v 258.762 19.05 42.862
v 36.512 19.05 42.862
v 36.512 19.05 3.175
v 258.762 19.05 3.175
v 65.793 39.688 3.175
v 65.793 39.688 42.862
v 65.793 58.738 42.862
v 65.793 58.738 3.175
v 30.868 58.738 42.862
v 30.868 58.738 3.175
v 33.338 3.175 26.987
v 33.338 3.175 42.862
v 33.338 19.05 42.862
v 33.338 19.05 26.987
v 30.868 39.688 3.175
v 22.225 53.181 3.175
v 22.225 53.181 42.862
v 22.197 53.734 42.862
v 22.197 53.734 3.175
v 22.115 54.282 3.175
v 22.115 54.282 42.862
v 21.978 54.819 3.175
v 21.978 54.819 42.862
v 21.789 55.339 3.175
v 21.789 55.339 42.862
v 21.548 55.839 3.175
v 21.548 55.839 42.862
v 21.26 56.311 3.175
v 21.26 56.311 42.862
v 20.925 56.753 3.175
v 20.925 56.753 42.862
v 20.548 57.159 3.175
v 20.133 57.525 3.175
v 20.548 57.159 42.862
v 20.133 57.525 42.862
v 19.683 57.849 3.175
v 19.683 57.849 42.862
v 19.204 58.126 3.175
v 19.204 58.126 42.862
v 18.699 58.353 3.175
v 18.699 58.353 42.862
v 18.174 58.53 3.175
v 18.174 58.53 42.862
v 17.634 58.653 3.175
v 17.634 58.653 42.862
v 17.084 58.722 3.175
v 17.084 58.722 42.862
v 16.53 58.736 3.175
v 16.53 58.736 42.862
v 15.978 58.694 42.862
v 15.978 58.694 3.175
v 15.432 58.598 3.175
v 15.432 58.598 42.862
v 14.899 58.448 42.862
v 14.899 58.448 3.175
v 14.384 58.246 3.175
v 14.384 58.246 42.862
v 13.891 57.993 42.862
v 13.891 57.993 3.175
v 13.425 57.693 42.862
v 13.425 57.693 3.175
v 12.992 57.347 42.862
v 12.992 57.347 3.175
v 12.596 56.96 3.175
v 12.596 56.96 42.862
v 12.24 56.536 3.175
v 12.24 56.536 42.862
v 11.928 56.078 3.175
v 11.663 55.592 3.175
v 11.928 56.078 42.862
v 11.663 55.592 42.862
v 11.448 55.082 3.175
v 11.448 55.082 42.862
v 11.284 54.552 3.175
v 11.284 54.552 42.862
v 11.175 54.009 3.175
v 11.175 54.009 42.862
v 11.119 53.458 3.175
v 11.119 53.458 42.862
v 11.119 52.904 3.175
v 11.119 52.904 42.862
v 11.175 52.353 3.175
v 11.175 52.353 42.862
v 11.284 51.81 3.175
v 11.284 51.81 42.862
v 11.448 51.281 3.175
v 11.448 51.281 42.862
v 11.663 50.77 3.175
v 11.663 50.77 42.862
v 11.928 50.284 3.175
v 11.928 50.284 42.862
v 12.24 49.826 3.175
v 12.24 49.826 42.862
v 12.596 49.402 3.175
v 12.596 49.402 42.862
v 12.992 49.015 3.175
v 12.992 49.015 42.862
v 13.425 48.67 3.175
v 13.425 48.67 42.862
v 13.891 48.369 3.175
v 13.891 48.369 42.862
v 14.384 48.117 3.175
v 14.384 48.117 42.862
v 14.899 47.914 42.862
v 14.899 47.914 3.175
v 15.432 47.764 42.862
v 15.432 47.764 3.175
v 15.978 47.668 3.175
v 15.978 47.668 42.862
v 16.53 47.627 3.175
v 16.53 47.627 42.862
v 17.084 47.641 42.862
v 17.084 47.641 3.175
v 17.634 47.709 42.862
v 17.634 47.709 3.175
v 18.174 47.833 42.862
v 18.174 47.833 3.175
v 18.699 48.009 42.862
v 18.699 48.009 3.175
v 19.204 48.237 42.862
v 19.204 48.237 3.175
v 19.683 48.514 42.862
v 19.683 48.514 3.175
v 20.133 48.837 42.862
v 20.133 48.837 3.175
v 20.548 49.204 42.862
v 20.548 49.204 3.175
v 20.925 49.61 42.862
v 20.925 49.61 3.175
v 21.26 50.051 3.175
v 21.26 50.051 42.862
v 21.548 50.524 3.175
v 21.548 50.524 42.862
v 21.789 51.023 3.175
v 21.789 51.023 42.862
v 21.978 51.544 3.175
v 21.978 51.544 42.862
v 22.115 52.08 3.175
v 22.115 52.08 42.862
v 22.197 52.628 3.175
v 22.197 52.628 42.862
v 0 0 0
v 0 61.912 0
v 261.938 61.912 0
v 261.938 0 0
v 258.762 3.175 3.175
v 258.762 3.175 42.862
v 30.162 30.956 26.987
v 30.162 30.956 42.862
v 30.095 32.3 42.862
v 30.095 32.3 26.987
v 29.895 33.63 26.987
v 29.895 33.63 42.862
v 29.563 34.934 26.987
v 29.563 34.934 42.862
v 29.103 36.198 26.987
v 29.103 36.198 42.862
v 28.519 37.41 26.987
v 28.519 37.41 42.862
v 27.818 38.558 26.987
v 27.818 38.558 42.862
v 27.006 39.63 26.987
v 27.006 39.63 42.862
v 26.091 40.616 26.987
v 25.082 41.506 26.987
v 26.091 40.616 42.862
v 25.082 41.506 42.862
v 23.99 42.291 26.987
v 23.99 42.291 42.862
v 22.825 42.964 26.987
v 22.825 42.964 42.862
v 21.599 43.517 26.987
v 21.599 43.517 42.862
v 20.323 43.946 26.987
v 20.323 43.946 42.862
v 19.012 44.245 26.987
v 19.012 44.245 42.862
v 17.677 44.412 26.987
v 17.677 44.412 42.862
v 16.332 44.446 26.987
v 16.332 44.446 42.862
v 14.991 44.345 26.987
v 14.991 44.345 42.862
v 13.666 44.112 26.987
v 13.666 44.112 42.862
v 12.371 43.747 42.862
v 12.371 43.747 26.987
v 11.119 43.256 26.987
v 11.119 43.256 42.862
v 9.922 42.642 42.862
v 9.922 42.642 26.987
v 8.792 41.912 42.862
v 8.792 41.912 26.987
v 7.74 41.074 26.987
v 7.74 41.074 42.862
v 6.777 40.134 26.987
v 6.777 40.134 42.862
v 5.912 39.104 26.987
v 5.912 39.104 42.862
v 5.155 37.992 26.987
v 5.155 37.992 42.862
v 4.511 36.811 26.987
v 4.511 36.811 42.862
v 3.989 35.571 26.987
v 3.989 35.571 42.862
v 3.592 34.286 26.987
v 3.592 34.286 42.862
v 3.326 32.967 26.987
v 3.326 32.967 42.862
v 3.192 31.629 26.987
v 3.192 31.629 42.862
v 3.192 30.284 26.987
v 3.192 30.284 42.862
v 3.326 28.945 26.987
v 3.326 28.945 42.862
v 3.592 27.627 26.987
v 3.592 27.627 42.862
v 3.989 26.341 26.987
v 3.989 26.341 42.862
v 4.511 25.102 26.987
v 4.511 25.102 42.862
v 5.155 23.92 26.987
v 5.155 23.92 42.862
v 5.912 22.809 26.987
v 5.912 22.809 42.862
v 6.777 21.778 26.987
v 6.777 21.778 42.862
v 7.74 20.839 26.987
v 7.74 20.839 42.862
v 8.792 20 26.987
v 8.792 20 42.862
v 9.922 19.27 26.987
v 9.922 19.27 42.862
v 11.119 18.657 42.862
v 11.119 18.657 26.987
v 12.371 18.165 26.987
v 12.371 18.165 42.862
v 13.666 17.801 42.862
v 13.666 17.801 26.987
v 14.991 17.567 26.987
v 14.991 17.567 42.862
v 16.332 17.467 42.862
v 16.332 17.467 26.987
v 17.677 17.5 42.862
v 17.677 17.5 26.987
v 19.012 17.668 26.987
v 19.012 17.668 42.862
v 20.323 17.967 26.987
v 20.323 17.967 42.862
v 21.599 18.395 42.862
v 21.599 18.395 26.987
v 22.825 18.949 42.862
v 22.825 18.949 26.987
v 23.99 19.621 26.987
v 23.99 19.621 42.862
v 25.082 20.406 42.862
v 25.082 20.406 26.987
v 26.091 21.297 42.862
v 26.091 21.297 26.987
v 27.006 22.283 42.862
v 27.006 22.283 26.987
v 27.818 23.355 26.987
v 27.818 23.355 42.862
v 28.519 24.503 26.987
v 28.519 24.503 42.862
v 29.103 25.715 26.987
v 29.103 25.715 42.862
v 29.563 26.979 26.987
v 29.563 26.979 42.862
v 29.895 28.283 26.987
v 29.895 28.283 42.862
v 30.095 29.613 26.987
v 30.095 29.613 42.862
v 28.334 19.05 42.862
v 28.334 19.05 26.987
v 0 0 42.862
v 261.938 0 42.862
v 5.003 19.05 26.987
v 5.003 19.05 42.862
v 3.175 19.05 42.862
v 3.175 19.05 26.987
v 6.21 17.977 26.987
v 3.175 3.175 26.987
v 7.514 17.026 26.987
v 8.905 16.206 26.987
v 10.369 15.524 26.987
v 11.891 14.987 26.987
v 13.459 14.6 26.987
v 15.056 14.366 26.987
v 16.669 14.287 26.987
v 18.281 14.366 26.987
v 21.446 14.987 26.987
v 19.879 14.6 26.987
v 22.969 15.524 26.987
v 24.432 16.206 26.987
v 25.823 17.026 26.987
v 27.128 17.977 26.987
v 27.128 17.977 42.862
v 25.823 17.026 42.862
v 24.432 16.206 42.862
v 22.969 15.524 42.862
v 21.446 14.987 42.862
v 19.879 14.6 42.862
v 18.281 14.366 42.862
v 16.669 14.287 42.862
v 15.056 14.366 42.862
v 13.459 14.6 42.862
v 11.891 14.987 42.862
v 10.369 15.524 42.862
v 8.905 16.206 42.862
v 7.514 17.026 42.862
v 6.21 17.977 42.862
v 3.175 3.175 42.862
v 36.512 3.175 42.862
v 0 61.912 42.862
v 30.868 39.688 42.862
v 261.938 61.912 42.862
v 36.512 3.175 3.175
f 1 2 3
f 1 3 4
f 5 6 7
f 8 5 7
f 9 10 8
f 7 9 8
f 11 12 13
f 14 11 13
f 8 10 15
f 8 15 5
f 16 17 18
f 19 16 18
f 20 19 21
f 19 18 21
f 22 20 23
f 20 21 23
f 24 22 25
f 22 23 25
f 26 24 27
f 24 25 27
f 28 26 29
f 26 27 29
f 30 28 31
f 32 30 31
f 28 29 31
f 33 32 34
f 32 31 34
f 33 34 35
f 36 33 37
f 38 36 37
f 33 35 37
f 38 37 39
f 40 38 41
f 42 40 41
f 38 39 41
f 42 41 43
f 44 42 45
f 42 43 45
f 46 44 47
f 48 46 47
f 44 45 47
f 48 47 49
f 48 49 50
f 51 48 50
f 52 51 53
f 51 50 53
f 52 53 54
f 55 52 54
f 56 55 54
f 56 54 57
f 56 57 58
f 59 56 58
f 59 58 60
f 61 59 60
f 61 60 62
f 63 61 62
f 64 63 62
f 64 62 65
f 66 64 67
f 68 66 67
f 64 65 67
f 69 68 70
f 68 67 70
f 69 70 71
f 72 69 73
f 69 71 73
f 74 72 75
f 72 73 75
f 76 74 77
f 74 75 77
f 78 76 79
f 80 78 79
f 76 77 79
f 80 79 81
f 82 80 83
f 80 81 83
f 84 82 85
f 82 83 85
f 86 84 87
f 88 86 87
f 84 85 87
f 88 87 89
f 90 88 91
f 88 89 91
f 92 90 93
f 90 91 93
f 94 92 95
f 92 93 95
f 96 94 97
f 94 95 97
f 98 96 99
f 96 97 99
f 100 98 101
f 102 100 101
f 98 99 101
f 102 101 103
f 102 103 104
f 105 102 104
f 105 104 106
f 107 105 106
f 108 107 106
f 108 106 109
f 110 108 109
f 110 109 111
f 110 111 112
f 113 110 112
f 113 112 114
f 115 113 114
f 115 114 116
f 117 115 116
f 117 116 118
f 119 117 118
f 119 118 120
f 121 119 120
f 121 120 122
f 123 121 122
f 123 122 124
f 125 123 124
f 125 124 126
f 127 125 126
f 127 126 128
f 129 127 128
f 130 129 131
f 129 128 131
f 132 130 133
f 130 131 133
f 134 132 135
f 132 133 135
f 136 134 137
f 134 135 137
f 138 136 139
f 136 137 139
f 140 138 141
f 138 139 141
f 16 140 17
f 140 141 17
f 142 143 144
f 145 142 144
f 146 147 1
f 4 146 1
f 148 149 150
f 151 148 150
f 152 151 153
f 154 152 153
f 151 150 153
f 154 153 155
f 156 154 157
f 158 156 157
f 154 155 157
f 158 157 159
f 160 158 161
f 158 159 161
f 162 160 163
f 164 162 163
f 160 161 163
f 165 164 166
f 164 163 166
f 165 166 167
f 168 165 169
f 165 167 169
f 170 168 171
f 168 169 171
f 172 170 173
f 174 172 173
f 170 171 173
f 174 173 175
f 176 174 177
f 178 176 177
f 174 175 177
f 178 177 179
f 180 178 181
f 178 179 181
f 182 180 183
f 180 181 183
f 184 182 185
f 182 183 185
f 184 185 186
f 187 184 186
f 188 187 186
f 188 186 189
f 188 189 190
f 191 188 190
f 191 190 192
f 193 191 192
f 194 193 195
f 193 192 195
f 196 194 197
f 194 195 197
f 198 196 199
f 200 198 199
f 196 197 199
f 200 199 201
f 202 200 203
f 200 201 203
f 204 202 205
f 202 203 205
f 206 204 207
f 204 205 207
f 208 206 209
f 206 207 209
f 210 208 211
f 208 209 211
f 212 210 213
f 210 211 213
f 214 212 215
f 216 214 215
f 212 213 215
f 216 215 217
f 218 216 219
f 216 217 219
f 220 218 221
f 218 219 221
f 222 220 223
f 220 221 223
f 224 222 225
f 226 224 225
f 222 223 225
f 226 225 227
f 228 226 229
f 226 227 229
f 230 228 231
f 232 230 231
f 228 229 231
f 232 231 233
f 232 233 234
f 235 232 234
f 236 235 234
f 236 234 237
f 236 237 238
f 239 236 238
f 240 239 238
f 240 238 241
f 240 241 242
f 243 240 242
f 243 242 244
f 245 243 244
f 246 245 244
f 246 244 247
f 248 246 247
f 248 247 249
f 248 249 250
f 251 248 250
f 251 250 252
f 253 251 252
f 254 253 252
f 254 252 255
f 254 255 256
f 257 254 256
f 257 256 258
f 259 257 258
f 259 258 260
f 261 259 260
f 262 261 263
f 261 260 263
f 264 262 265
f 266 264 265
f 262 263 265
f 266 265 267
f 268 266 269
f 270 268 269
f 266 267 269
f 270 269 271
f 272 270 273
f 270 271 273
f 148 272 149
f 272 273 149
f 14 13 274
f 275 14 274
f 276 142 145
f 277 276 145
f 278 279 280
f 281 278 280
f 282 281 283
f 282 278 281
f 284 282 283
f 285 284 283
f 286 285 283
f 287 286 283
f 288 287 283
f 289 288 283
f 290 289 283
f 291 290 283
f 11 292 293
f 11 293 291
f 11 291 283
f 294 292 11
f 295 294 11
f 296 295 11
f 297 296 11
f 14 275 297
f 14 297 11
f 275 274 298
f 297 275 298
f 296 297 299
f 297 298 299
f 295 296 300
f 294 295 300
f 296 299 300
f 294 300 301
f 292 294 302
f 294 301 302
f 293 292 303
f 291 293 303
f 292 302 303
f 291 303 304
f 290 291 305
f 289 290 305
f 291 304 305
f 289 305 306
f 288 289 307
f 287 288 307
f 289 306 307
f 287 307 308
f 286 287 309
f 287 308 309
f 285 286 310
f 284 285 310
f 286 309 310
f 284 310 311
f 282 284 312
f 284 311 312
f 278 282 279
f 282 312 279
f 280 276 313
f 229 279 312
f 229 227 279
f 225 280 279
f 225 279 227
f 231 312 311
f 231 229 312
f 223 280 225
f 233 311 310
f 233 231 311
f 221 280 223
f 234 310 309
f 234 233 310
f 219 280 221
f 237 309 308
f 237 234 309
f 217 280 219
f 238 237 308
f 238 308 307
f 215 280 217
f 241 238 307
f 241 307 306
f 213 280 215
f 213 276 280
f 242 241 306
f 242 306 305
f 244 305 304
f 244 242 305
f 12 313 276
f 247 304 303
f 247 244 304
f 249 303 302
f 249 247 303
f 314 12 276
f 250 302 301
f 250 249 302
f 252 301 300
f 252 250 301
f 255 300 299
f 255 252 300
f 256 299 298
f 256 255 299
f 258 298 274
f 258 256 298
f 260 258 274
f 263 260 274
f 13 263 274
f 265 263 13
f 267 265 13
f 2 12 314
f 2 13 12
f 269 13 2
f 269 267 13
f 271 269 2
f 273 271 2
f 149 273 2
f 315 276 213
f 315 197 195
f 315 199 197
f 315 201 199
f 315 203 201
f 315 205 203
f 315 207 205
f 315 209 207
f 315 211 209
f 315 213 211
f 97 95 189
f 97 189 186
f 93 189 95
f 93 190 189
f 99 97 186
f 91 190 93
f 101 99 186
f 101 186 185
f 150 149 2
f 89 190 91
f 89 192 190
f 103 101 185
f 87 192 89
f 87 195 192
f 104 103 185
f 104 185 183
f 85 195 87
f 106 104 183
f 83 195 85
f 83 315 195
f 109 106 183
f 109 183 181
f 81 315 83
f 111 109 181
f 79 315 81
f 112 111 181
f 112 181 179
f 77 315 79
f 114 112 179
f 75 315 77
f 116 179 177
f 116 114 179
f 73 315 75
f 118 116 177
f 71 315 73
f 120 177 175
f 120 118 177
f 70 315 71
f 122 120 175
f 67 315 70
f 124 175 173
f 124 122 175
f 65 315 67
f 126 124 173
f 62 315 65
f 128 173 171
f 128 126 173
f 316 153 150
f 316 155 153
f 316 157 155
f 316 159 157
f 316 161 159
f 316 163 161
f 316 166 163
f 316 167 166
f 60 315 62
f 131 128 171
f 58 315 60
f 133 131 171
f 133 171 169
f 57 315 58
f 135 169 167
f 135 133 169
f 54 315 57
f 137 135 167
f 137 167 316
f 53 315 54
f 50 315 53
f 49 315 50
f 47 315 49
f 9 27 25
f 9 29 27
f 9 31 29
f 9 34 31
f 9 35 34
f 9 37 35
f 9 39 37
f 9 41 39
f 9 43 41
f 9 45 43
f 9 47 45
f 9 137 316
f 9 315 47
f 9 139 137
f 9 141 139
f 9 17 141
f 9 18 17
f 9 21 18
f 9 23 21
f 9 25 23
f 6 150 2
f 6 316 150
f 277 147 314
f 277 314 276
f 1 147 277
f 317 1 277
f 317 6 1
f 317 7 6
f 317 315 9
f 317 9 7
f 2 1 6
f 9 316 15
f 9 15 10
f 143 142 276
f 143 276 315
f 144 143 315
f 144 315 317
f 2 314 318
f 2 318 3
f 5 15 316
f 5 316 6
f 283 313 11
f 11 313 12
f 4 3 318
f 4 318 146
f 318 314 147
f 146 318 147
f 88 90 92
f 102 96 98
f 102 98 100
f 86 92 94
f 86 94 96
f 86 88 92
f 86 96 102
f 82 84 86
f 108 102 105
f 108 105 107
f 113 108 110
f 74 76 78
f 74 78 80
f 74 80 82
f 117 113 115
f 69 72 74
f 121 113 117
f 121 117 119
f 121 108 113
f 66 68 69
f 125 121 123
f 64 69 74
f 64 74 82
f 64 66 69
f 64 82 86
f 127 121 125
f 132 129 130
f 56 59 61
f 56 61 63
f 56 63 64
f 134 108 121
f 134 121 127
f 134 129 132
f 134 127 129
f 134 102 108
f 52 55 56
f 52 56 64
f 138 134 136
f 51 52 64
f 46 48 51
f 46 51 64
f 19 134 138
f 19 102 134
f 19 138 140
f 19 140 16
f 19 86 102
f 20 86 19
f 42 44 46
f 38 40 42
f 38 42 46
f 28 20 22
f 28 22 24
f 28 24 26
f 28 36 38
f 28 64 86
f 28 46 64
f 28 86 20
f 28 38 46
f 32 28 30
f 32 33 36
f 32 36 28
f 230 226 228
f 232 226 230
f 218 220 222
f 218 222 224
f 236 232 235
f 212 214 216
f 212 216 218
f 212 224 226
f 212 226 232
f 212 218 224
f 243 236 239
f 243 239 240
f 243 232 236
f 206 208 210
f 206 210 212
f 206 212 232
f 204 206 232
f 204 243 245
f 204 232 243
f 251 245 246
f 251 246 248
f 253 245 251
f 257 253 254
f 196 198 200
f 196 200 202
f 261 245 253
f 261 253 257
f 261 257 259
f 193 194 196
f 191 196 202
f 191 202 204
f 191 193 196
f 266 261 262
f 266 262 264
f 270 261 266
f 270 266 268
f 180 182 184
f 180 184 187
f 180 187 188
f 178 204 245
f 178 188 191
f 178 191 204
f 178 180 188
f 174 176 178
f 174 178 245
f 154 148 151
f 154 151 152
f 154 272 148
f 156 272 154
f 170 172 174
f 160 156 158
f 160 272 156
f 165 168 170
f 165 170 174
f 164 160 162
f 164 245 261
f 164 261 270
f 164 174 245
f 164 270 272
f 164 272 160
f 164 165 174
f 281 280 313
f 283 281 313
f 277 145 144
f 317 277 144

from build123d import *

# Parameters (mm, degrees)
F0_W     = 261.9375
F0_H     = 61.9125
F1_DEPTH = 42.8625
F2_R     = 5.55625
F2_W     = 34.925
F2_H     = 19.05
F2_W_2   = 222.25
F2_H_2   = 15.875
F3_DEPTH = 39.6875
F4_R     = 13.49375
F5_DEPTH = 15.875


# Not quite as in the source:
# - a feature of the source that left no trace in its solid (it failed there, or was rolled back) is left out


with BuildPart() as f1:
    # F0 (on Top) → F1 (new body)
    with BuildSketch(Plane.XY):
        with Locations((130.96875, 30.95625)):
            Rectangle(F0_W, F0_H)
    extrude(amount=F1_DEPTH)

    # F2 (on face) → F3 (cut, through all)
    with BuildSketch(Plane.XY.offset(42.8625)):
        with Locations((16.66875, 53.18125)):
            Circle(F2_R)
        with Locations((48.3302816571, 49.2125)):
            Rectangle(F2_W, F2_H)
        with Locations((147.6375, 11.1125)):
            Rectangle(F2_W_2, F2_H_2)
    extrude(amount=-F3_DEPTH, mode=Mode.SUBTRACT)

    # F4 (on face) → F5 (cut)
    with BuildSketch(Plane.XY.offset(42.8625)):
        with Locations((16.66875, 30.95625)):
            Circle(F4_R)
        with BuildLine():
            Line((3.175, 19.05), (3.175, 3.175))
            Line((3.175, 3.175), (33.3375, 3.175))
            Line((33.3375, 3.175), (33.3375, 19.05))
            Line((33.3375, 19.05), (28.3344449, 19.05))
            ThreePointArc((28.3344449, 19.05), (16.66875, 14.2875), (5.0030551, 19.05))
            Line((5.0030551, 19.05), (3.175, 19.05))
        make_face()
    extrude(amount=-F5_DEPTH, mode=Mode.SUBTRACT)


solid = f1.part
